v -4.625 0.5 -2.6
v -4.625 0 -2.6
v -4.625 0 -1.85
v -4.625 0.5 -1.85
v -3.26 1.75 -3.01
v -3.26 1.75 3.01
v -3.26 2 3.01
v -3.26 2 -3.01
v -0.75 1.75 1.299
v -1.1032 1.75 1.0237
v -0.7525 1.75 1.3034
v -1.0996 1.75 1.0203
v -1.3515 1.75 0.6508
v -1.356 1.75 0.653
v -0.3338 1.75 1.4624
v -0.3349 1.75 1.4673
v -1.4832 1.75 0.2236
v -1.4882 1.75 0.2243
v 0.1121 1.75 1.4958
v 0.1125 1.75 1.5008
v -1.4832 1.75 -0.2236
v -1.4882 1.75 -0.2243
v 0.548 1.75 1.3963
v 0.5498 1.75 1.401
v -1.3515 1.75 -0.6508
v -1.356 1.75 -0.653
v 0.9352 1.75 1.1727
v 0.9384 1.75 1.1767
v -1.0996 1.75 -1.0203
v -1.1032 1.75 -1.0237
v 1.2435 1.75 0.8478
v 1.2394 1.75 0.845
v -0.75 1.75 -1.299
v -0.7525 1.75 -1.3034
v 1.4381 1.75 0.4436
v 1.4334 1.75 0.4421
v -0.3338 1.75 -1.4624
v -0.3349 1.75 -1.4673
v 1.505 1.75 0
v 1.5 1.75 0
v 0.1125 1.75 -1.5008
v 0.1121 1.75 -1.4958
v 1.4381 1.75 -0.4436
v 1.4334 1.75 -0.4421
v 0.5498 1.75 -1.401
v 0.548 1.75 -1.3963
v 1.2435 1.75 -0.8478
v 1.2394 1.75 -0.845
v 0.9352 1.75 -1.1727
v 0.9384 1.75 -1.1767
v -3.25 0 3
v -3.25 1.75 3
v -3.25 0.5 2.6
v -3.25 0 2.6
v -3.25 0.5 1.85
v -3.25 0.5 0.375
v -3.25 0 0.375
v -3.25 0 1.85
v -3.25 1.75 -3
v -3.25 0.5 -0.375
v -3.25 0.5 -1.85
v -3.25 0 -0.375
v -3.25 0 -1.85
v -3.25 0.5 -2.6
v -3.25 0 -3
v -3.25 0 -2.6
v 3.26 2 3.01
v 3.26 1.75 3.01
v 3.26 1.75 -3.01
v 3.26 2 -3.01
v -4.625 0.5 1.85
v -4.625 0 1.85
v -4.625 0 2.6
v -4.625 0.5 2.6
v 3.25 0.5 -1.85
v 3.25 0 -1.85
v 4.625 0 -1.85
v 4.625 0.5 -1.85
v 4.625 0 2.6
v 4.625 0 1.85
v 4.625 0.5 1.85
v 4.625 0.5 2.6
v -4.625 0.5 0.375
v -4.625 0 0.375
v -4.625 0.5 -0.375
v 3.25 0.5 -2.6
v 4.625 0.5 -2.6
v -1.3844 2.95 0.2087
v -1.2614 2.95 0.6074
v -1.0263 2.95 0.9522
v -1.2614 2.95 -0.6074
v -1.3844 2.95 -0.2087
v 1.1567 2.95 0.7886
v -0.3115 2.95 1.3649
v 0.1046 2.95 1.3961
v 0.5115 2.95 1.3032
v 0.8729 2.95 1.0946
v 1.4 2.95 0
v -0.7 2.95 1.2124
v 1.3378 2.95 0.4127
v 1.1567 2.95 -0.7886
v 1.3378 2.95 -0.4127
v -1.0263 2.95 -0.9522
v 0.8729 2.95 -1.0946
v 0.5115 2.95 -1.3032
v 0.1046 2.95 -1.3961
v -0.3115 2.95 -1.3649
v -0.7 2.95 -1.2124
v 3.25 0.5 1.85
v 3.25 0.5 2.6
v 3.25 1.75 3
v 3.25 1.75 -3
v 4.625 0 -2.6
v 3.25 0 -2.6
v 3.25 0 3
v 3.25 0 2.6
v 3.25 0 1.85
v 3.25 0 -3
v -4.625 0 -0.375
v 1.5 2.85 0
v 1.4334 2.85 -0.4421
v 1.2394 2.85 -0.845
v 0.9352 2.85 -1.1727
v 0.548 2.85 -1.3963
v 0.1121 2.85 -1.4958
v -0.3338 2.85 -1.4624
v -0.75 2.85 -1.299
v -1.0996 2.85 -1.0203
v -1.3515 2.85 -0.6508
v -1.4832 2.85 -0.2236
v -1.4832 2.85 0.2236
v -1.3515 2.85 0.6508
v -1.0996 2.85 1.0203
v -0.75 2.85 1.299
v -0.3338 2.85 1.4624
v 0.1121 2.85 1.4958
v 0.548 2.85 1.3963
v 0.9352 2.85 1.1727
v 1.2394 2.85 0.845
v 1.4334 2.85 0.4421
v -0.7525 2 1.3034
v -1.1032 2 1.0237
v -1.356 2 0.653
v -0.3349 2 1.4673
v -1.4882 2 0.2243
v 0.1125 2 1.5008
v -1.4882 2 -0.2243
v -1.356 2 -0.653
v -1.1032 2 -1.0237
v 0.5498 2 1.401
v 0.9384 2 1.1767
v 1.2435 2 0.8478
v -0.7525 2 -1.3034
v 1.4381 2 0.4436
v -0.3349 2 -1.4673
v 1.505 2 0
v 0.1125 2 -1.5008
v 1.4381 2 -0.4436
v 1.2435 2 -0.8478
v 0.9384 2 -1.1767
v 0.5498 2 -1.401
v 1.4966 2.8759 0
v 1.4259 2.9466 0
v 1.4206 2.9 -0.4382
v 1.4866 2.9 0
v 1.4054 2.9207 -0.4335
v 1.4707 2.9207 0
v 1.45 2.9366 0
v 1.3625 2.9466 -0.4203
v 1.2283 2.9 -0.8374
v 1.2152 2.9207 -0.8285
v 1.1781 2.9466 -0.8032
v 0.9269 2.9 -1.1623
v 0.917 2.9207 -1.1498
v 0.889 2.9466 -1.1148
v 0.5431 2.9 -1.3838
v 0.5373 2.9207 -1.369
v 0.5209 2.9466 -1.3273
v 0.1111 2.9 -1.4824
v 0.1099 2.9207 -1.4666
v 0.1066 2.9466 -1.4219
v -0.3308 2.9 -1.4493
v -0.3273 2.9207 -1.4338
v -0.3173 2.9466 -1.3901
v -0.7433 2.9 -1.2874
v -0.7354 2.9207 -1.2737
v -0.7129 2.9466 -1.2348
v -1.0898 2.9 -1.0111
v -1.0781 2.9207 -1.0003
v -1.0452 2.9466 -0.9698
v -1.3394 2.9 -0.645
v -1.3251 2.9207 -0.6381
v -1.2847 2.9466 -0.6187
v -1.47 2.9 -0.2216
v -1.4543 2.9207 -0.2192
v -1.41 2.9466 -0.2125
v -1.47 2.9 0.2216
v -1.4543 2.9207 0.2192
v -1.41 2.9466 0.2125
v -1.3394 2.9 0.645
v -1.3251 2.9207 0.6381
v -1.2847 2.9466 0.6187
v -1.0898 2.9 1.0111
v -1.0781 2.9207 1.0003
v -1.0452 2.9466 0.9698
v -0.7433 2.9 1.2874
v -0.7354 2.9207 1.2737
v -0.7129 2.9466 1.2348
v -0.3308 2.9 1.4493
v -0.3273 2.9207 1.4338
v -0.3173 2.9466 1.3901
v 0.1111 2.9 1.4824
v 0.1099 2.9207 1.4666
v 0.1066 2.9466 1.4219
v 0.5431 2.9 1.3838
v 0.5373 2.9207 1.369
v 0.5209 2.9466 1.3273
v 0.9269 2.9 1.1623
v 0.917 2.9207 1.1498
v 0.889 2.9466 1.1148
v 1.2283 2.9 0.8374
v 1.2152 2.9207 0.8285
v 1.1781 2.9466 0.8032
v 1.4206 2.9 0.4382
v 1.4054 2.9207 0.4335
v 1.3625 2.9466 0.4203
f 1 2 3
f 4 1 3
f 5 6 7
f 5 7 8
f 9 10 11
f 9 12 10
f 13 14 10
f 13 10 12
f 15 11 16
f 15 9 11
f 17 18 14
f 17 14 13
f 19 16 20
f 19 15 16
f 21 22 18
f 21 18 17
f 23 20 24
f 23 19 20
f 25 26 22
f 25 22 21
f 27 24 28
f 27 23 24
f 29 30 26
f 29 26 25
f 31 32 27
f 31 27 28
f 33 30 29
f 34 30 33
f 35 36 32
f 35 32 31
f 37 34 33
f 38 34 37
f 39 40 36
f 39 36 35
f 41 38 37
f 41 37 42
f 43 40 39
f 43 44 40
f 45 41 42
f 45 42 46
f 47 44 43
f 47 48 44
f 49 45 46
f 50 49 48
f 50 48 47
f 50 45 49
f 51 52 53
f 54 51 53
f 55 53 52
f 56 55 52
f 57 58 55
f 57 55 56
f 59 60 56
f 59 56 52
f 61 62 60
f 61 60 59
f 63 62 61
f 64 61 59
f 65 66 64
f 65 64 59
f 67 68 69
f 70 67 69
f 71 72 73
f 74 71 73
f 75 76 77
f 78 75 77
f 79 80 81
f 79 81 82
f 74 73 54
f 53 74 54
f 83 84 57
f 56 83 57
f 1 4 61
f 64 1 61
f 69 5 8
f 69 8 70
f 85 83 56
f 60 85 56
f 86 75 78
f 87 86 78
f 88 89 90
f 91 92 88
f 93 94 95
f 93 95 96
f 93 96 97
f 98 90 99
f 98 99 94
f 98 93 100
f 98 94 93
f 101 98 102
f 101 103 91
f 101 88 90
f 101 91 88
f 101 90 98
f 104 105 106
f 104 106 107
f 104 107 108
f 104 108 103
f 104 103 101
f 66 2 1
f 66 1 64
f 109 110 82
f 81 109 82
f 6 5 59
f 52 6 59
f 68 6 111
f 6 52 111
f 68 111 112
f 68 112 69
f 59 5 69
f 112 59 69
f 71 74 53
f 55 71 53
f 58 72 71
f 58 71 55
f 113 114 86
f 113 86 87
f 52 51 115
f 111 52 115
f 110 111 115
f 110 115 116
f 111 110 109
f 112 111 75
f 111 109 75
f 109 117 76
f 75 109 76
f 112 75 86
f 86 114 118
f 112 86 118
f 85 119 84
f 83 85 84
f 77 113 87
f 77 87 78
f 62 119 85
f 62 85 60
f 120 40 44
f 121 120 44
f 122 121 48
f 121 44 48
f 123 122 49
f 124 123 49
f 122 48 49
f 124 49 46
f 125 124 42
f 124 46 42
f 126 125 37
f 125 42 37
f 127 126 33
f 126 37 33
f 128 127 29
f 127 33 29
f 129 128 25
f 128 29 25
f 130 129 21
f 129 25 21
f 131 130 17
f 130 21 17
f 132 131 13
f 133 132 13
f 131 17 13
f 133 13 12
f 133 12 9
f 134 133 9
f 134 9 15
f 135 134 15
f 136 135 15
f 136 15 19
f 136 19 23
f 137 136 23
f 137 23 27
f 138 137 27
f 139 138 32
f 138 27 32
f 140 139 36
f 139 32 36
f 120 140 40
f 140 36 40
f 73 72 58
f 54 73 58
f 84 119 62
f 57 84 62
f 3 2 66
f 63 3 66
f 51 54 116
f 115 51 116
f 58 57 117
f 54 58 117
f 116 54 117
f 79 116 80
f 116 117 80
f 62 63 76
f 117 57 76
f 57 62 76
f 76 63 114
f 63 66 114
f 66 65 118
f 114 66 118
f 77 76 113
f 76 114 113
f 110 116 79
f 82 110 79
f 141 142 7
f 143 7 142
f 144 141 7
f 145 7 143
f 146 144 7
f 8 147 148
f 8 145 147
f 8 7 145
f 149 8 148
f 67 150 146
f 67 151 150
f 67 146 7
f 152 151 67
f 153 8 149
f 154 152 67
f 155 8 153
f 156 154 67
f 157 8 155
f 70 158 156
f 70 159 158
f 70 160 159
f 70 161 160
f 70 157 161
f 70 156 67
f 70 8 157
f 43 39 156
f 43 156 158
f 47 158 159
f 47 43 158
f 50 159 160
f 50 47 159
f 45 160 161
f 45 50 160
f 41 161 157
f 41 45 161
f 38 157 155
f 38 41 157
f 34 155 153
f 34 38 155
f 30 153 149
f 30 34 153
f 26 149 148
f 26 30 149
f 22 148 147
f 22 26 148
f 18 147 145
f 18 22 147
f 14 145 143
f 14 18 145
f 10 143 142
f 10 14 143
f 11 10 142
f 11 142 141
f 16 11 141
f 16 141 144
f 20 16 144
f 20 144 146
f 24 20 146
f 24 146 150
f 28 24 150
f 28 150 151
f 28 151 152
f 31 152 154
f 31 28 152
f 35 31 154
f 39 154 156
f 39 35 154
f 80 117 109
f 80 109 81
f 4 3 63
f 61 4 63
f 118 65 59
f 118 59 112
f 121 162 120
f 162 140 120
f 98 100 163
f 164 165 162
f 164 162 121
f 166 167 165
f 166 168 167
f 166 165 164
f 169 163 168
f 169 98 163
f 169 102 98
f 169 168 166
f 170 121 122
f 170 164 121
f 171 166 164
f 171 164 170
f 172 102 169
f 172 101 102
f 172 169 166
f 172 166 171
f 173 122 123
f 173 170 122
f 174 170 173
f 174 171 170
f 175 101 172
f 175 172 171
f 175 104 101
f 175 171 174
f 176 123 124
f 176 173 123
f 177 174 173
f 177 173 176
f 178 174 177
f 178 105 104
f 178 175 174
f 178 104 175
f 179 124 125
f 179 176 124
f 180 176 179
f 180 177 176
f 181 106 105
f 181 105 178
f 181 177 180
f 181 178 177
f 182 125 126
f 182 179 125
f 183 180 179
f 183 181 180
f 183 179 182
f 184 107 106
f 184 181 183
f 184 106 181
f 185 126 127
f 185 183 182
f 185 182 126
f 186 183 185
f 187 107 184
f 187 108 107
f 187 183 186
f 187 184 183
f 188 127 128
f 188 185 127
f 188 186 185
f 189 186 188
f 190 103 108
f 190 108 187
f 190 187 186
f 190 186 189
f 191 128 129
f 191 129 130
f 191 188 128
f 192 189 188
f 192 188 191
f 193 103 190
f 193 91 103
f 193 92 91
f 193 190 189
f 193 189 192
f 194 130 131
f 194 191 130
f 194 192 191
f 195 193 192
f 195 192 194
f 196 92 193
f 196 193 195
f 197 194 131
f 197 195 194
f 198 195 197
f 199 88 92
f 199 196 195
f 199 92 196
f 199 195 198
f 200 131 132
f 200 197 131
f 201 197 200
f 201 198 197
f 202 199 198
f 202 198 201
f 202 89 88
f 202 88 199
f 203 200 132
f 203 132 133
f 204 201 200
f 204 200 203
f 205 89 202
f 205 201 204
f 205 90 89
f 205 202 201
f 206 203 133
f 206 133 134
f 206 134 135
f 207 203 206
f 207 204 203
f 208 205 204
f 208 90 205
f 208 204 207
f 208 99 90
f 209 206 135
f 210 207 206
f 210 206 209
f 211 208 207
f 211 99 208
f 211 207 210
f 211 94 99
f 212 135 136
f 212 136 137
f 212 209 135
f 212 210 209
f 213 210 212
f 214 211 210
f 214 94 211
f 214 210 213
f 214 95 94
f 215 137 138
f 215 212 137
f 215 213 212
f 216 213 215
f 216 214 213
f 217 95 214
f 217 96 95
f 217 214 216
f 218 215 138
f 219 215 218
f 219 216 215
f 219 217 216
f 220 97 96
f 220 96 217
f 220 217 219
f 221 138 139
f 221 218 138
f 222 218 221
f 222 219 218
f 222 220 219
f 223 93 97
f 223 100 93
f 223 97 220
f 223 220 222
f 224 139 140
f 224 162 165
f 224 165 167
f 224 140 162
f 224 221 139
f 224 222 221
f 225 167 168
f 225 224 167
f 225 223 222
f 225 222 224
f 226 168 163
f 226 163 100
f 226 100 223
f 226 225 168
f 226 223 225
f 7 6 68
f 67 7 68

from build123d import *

# Parameters (mm, degrees)
SKETCH1_W           = 6.5
SKETCH1_H           = 6
BOSS_EXTRUDE1_DEPTH = 1.75
SKETCH2_W           = 6.52
SKETCH2_H           = 6.02
SKETCH2_R           = 1.505
BOSS_EXTRUDE2_DEPTH = 0.25
SKETCH3_R           = 1.5
BOSS_EXTRUDE3_DEPTH = 1.2
FILLET1_R           = 0.1
SKETCH4_W           = 1.375
SKETCH4_H           = 0.75
BOSS_EXTRUDE4_DEPTH = 0.5


with BuildPart() as part:
    # Sketch1 → Boss-Extrude1 (new body)
    with BuildSketch(Plane(origin=(0, 0, 0), x_dir=(1, 0, 0), z_dir=(0, 1, 0))):
        Rectangle(SKETCH1_W, SKETCH1_H)
    extrude(amount=BOSS_EXTRUDE1_DEPTH)

    # Sketch2 → Boss-Extrude2 (add)
    with BuildSketch(Plane(origin=(0, 1.75, 0), x_dir=(1, 0, 0), z_dir=(0, 1, 0))):
        Rectangle(SKETCH2_W, SKETCH2_H)
        Circle(SKETCH2_R, mode=Mode.SUBTRACT)
    extrude(amount=BOSS_EXTRUDE2_DEPTH)

    # Sketch3 → Boss-Extrude3 (add)
    with BuildSketch(Plane(origin=(0, 1.75, 0), x_dir=(1, 0, 0), z_dir=(0, 1, 0))):
        Circle(SKETCH3_R)
    extrude(amount=BOSS_EXTRUDE3_DEPTH)

    # Fillet1
    fillet1_edges = [part.edges().sort_by_distance(p)[0] for p in [
        (-1.5, 2.95, 0),
    ]]
    fillet(fillet1_edges, radius=FILLET1_R)

    # Sketch4 → Boss-Extrude4 (add)
    with BuildSketch(Plane.XZ):
        with Locations((3.9375, 2.225)):
            Rectangle(SKETCH4_W, SKETCH4_H)
        with Locations((3.9375, -2.225)):
            Rectangle(SKETCH4_W, SKETCH4_H)
        with Locations((-3.9375, -2.225)):
            Rectangle(SKETCH4_W, SKETCH4_H)
        with Locations((-3.9375, 2.225)):
            Rectangle(SKETCH4_W, SKETCH4_H)
        with Locations((-3.9375, 0)):
            Rectangle(SKETCH4_W, SKETCH4_H)
    extrude(amount=-BOSS_EXTRUDE4_DEPTH)


solid = part.part
